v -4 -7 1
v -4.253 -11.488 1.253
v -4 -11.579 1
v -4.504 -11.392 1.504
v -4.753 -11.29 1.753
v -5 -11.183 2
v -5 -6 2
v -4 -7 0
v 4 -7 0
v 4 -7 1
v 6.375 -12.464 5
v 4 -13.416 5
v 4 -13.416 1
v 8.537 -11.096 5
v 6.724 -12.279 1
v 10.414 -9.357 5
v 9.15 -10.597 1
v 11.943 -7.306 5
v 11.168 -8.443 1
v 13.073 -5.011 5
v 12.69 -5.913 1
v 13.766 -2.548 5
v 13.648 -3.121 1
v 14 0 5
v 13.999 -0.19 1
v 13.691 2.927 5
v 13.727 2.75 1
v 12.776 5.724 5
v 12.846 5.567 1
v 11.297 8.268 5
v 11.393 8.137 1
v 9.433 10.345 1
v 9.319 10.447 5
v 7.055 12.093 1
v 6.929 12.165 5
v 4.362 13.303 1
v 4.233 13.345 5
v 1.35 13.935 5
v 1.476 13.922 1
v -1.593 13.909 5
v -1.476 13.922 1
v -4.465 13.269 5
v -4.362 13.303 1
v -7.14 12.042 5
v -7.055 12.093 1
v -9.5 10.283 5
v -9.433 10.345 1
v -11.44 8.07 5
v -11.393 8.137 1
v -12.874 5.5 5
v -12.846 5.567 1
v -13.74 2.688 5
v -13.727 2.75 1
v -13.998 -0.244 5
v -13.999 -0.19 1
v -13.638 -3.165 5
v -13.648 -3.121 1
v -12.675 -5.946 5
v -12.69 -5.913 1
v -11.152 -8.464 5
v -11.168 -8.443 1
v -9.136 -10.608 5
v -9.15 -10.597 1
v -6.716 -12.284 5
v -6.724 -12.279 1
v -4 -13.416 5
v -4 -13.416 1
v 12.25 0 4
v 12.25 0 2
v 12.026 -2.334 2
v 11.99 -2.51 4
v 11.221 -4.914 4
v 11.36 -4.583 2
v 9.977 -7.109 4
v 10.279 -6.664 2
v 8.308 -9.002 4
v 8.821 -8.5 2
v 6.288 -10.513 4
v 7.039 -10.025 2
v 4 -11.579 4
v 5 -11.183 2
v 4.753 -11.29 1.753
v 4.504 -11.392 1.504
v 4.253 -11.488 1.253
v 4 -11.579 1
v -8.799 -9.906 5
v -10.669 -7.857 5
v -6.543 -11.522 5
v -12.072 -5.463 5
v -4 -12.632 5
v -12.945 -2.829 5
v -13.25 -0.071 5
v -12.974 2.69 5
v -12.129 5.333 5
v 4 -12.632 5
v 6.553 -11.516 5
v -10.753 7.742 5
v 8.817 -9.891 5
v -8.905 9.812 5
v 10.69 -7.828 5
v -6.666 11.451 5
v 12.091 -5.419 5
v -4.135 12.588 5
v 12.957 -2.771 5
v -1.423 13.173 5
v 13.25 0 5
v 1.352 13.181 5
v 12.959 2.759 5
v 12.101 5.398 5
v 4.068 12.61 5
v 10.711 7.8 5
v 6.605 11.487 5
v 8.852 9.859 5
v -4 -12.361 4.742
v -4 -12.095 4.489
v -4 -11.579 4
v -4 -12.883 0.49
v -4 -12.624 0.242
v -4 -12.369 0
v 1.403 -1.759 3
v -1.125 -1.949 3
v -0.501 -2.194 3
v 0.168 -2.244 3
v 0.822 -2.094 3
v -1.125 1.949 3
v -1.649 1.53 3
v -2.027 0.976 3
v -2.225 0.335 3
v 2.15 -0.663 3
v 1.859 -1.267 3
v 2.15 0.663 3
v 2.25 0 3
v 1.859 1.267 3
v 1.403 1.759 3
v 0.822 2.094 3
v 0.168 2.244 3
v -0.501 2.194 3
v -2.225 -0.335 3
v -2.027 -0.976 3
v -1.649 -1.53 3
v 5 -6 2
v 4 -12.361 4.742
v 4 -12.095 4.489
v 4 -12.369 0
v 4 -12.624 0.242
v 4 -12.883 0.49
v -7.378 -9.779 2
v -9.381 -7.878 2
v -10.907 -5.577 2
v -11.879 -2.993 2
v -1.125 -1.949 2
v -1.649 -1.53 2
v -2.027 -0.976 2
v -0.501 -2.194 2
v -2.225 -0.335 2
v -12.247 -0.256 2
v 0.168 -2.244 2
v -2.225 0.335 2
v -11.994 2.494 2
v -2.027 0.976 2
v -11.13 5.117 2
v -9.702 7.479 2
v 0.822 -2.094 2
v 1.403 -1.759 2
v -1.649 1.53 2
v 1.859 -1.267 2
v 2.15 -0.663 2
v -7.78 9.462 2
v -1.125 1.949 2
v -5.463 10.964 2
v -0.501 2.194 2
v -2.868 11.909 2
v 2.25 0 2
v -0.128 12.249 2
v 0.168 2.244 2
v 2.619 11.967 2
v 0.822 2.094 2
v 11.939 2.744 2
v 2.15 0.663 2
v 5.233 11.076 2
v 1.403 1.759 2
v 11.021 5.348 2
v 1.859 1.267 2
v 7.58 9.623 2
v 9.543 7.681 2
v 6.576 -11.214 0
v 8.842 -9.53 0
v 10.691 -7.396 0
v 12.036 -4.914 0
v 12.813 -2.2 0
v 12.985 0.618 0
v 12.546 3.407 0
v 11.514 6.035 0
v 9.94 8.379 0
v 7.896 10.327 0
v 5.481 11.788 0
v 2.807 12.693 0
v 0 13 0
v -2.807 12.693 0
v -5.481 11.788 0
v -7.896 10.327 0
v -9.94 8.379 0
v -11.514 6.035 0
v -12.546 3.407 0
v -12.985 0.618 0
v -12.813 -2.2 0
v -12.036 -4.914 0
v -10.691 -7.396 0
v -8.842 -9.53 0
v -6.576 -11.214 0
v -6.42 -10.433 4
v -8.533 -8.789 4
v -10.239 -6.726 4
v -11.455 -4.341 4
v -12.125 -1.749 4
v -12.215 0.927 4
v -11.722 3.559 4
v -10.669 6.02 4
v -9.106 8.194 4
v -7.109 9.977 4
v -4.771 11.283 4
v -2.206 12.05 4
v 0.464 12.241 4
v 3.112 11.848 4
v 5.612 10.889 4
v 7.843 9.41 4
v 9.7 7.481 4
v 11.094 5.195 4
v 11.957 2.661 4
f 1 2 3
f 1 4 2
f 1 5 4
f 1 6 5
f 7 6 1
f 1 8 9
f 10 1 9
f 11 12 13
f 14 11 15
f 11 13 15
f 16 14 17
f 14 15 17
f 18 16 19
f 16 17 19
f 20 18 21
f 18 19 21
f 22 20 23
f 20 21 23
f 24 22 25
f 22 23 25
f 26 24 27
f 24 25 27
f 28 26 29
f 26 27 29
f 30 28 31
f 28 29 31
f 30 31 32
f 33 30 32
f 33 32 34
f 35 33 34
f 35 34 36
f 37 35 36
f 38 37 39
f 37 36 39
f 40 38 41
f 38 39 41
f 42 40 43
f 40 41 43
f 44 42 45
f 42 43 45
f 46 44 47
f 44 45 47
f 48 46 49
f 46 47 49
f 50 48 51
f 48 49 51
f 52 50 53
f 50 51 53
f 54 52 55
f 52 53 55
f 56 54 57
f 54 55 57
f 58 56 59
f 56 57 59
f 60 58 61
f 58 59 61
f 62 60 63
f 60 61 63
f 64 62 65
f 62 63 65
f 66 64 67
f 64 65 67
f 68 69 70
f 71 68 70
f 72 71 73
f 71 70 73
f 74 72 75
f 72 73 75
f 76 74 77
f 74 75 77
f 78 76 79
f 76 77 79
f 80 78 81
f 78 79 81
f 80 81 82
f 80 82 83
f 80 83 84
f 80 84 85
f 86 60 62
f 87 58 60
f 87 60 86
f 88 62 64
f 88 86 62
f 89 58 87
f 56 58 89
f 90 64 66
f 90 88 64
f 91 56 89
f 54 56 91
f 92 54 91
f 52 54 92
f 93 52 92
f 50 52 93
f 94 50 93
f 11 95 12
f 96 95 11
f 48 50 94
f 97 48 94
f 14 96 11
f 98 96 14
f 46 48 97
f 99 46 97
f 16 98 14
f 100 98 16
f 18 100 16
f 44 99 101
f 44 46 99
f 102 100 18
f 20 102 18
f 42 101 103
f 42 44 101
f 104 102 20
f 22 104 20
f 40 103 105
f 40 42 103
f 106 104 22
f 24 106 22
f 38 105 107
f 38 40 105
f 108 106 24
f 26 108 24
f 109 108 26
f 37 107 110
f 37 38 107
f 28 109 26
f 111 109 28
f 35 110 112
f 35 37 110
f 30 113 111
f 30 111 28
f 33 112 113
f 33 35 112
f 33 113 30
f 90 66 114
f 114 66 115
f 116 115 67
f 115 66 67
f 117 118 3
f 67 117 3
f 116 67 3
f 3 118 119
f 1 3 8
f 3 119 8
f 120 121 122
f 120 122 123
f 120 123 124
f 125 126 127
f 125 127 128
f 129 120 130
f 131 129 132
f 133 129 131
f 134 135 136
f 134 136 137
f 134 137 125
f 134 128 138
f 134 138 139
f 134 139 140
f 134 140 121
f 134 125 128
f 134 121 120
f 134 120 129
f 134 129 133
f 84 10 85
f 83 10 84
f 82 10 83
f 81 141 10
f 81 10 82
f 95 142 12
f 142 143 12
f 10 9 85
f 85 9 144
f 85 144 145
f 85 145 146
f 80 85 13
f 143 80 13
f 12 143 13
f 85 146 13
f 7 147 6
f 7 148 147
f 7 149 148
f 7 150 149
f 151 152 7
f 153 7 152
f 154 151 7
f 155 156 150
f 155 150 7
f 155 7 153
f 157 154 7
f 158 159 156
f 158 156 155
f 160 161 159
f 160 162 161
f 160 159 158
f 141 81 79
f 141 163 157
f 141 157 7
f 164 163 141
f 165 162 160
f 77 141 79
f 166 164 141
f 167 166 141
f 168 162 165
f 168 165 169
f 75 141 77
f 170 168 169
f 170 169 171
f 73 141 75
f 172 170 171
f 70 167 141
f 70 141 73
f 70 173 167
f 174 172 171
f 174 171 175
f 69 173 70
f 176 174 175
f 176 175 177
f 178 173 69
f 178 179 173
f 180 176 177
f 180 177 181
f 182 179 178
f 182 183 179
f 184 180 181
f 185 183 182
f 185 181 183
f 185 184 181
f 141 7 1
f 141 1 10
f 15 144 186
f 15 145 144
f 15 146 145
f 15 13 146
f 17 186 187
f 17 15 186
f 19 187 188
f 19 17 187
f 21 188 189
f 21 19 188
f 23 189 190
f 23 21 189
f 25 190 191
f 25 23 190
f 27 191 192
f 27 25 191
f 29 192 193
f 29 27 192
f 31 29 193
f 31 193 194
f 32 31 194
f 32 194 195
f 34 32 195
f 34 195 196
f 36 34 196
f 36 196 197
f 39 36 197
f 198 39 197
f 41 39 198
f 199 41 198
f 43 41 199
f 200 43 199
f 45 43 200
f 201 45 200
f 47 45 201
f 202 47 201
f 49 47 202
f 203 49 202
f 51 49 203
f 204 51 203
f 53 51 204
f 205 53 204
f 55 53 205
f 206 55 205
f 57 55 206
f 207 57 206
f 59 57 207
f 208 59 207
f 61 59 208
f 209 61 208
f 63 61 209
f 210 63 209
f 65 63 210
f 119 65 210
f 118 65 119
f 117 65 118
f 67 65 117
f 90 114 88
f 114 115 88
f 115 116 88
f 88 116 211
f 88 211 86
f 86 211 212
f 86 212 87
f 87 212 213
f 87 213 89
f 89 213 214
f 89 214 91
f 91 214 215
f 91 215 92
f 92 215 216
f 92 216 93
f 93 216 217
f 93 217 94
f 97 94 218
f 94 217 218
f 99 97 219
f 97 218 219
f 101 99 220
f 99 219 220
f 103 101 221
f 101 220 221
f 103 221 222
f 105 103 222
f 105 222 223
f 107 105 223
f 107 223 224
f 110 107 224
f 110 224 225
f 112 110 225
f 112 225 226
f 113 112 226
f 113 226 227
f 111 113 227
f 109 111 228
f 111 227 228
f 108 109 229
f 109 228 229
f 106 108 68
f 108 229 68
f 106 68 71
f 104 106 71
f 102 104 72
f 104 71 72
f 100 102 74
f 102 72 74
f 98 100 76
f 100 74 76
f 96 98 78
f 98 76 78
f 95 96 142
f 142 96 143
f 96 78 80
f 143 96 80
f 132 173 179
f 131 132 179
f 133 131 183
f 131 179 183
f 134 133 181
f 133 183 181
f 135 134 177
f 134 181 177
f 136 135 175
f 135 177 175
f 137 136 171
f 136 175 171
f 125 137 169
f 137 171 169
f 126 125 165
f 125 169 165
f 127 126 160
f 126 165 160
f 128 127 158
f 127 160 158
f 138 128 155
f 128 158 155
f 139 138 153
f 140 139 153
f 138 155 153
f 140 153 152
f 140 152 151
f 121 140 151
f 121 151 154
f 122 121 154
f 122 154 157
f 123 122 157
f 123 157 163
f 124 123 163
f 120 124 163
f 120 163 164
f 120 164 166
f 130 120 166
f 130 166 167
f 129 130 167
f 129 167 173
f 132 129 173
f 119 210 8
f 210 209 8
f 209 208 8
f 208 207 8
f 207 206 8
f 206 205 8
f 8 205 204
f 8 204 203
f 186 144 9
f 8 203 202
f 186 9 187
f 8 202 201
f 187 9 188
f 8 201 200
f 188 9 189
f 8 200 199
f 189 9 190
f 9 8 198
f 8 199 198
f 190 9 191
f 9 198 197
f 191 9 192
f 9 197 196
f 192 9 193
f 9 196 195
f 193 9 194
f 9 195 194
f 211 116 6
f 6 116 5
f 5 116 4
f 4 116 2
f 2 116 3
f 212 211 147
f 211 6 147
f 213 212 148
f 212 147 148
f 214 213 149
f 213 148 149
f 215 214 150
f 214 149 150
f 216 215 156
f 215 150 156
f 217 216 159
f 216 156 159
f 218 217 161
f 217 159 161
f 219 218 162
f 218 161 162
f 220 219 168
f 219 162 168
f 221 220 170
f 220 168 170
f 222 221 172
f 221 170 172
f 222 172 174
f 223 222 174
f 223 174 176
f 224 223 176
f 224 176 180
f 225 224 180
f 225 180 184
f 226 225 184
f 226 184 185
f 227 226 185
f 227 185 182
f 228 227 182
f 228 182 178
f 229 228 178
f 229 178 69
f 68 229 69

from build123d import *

# Parameters (mm, degrees)
F0_R     = 2.25
F1_DEPTH = 2
F2_DEPTH = 5
F3_DEPTH = 3
F4_SIZE  = 0.99999


# Not quite as in the source:
# - a fillet or chamfer is up to 0.001 mm smaller than in the source, because OpenCascade refuses the exact size


with BuildPart() as f1:
    # F0 (on Top) → F1 (new body)
    with BuildSketch(Plane.XY):
        with BuildLine():
            ThreePointArc((4, -13.416407865), (11.2249721603, -8.3666002653), (14, 0))
            ThreePointArc((14, 0), (-8.3666002653, 11.2249721603), (-4, -13.416407865))
            Line((-4, -13.416407865), (-4, -11.5785361769))
            ThreePointArc((-4, -11.5785361769), (-7.1085336041, 9.9765349696), (12.25, 0))
            ThreePointArc((12.25, 0), (9.9765349696, -7.1085336041), (4, -11.5785361769))
            Line((4, -11.5785361769), (4, -13.416407865))
        make_face()
        with BuildLine():
            ThreePointArc((12.25, 0), (-7.1085336041, 9.9765349696), (-4, -11.5785361769))
            Line((-4, -11.5785361769), (-4, -7))
            Line((-4, -7), (4, -7))
            Line((4, -7), (4, -11.5785361769))
            ThreePointArc((4, -11.5785361769), (9.9765349696, -7.1085336041), (12.25, 0))
        make_face()
        Circle(F0_R, mode=Mode.SUBTRACT)
        Circle(F0_R)
    extrude(amount=F1_DEPTH)

    # F0 (on Top) → F2 (join)
    with BuildSketch(Plane.XY):
        with BuildLine():
            ThreePointArc((4, -13.416407865), (11.2249721603, -8.3666002653), (14, 0))
            ThreePointArc((14, 0), (-8.3666002653, 11.2249721603), (-4, -13.416407865))
            Line((-4, -13.416407865), (-4, -11.5785361769))
            ThreePointArc((-4, -11.5785361769), (-7.1085336041, 9.9765349696), (12.25, 0))
            ThreePointArc((12.25, 0), (9.9765349696, -7.1085336041), (4, -11.5785361769))
            Line((4, -11.5785361769), (4, -13.416407865))
        make_face()
    extrude(amount=F2_DEPTH)

    # F0 (on Top) → F3 (join)
    with BuildSketch(Plane.XY):
        Circle(F0_R)
    extrude(amount=F3_DEPTH)

    # F4 (size 1 in the source; OpenCascade refuses exactly that, so slightly less here)
    f4_edges = [f1.edges().sort_by_distance(p)[0] for p in [
        (0, 14, 0),
        (-7.108534, 9.976535, 5),
        (0, -7, 2),
        (-4, -9.289268, 2),
        (4, -9.289268, 2),
    ]]
    chamfer(f4_edges, length=F4_SIZE)


solid = f1.part
